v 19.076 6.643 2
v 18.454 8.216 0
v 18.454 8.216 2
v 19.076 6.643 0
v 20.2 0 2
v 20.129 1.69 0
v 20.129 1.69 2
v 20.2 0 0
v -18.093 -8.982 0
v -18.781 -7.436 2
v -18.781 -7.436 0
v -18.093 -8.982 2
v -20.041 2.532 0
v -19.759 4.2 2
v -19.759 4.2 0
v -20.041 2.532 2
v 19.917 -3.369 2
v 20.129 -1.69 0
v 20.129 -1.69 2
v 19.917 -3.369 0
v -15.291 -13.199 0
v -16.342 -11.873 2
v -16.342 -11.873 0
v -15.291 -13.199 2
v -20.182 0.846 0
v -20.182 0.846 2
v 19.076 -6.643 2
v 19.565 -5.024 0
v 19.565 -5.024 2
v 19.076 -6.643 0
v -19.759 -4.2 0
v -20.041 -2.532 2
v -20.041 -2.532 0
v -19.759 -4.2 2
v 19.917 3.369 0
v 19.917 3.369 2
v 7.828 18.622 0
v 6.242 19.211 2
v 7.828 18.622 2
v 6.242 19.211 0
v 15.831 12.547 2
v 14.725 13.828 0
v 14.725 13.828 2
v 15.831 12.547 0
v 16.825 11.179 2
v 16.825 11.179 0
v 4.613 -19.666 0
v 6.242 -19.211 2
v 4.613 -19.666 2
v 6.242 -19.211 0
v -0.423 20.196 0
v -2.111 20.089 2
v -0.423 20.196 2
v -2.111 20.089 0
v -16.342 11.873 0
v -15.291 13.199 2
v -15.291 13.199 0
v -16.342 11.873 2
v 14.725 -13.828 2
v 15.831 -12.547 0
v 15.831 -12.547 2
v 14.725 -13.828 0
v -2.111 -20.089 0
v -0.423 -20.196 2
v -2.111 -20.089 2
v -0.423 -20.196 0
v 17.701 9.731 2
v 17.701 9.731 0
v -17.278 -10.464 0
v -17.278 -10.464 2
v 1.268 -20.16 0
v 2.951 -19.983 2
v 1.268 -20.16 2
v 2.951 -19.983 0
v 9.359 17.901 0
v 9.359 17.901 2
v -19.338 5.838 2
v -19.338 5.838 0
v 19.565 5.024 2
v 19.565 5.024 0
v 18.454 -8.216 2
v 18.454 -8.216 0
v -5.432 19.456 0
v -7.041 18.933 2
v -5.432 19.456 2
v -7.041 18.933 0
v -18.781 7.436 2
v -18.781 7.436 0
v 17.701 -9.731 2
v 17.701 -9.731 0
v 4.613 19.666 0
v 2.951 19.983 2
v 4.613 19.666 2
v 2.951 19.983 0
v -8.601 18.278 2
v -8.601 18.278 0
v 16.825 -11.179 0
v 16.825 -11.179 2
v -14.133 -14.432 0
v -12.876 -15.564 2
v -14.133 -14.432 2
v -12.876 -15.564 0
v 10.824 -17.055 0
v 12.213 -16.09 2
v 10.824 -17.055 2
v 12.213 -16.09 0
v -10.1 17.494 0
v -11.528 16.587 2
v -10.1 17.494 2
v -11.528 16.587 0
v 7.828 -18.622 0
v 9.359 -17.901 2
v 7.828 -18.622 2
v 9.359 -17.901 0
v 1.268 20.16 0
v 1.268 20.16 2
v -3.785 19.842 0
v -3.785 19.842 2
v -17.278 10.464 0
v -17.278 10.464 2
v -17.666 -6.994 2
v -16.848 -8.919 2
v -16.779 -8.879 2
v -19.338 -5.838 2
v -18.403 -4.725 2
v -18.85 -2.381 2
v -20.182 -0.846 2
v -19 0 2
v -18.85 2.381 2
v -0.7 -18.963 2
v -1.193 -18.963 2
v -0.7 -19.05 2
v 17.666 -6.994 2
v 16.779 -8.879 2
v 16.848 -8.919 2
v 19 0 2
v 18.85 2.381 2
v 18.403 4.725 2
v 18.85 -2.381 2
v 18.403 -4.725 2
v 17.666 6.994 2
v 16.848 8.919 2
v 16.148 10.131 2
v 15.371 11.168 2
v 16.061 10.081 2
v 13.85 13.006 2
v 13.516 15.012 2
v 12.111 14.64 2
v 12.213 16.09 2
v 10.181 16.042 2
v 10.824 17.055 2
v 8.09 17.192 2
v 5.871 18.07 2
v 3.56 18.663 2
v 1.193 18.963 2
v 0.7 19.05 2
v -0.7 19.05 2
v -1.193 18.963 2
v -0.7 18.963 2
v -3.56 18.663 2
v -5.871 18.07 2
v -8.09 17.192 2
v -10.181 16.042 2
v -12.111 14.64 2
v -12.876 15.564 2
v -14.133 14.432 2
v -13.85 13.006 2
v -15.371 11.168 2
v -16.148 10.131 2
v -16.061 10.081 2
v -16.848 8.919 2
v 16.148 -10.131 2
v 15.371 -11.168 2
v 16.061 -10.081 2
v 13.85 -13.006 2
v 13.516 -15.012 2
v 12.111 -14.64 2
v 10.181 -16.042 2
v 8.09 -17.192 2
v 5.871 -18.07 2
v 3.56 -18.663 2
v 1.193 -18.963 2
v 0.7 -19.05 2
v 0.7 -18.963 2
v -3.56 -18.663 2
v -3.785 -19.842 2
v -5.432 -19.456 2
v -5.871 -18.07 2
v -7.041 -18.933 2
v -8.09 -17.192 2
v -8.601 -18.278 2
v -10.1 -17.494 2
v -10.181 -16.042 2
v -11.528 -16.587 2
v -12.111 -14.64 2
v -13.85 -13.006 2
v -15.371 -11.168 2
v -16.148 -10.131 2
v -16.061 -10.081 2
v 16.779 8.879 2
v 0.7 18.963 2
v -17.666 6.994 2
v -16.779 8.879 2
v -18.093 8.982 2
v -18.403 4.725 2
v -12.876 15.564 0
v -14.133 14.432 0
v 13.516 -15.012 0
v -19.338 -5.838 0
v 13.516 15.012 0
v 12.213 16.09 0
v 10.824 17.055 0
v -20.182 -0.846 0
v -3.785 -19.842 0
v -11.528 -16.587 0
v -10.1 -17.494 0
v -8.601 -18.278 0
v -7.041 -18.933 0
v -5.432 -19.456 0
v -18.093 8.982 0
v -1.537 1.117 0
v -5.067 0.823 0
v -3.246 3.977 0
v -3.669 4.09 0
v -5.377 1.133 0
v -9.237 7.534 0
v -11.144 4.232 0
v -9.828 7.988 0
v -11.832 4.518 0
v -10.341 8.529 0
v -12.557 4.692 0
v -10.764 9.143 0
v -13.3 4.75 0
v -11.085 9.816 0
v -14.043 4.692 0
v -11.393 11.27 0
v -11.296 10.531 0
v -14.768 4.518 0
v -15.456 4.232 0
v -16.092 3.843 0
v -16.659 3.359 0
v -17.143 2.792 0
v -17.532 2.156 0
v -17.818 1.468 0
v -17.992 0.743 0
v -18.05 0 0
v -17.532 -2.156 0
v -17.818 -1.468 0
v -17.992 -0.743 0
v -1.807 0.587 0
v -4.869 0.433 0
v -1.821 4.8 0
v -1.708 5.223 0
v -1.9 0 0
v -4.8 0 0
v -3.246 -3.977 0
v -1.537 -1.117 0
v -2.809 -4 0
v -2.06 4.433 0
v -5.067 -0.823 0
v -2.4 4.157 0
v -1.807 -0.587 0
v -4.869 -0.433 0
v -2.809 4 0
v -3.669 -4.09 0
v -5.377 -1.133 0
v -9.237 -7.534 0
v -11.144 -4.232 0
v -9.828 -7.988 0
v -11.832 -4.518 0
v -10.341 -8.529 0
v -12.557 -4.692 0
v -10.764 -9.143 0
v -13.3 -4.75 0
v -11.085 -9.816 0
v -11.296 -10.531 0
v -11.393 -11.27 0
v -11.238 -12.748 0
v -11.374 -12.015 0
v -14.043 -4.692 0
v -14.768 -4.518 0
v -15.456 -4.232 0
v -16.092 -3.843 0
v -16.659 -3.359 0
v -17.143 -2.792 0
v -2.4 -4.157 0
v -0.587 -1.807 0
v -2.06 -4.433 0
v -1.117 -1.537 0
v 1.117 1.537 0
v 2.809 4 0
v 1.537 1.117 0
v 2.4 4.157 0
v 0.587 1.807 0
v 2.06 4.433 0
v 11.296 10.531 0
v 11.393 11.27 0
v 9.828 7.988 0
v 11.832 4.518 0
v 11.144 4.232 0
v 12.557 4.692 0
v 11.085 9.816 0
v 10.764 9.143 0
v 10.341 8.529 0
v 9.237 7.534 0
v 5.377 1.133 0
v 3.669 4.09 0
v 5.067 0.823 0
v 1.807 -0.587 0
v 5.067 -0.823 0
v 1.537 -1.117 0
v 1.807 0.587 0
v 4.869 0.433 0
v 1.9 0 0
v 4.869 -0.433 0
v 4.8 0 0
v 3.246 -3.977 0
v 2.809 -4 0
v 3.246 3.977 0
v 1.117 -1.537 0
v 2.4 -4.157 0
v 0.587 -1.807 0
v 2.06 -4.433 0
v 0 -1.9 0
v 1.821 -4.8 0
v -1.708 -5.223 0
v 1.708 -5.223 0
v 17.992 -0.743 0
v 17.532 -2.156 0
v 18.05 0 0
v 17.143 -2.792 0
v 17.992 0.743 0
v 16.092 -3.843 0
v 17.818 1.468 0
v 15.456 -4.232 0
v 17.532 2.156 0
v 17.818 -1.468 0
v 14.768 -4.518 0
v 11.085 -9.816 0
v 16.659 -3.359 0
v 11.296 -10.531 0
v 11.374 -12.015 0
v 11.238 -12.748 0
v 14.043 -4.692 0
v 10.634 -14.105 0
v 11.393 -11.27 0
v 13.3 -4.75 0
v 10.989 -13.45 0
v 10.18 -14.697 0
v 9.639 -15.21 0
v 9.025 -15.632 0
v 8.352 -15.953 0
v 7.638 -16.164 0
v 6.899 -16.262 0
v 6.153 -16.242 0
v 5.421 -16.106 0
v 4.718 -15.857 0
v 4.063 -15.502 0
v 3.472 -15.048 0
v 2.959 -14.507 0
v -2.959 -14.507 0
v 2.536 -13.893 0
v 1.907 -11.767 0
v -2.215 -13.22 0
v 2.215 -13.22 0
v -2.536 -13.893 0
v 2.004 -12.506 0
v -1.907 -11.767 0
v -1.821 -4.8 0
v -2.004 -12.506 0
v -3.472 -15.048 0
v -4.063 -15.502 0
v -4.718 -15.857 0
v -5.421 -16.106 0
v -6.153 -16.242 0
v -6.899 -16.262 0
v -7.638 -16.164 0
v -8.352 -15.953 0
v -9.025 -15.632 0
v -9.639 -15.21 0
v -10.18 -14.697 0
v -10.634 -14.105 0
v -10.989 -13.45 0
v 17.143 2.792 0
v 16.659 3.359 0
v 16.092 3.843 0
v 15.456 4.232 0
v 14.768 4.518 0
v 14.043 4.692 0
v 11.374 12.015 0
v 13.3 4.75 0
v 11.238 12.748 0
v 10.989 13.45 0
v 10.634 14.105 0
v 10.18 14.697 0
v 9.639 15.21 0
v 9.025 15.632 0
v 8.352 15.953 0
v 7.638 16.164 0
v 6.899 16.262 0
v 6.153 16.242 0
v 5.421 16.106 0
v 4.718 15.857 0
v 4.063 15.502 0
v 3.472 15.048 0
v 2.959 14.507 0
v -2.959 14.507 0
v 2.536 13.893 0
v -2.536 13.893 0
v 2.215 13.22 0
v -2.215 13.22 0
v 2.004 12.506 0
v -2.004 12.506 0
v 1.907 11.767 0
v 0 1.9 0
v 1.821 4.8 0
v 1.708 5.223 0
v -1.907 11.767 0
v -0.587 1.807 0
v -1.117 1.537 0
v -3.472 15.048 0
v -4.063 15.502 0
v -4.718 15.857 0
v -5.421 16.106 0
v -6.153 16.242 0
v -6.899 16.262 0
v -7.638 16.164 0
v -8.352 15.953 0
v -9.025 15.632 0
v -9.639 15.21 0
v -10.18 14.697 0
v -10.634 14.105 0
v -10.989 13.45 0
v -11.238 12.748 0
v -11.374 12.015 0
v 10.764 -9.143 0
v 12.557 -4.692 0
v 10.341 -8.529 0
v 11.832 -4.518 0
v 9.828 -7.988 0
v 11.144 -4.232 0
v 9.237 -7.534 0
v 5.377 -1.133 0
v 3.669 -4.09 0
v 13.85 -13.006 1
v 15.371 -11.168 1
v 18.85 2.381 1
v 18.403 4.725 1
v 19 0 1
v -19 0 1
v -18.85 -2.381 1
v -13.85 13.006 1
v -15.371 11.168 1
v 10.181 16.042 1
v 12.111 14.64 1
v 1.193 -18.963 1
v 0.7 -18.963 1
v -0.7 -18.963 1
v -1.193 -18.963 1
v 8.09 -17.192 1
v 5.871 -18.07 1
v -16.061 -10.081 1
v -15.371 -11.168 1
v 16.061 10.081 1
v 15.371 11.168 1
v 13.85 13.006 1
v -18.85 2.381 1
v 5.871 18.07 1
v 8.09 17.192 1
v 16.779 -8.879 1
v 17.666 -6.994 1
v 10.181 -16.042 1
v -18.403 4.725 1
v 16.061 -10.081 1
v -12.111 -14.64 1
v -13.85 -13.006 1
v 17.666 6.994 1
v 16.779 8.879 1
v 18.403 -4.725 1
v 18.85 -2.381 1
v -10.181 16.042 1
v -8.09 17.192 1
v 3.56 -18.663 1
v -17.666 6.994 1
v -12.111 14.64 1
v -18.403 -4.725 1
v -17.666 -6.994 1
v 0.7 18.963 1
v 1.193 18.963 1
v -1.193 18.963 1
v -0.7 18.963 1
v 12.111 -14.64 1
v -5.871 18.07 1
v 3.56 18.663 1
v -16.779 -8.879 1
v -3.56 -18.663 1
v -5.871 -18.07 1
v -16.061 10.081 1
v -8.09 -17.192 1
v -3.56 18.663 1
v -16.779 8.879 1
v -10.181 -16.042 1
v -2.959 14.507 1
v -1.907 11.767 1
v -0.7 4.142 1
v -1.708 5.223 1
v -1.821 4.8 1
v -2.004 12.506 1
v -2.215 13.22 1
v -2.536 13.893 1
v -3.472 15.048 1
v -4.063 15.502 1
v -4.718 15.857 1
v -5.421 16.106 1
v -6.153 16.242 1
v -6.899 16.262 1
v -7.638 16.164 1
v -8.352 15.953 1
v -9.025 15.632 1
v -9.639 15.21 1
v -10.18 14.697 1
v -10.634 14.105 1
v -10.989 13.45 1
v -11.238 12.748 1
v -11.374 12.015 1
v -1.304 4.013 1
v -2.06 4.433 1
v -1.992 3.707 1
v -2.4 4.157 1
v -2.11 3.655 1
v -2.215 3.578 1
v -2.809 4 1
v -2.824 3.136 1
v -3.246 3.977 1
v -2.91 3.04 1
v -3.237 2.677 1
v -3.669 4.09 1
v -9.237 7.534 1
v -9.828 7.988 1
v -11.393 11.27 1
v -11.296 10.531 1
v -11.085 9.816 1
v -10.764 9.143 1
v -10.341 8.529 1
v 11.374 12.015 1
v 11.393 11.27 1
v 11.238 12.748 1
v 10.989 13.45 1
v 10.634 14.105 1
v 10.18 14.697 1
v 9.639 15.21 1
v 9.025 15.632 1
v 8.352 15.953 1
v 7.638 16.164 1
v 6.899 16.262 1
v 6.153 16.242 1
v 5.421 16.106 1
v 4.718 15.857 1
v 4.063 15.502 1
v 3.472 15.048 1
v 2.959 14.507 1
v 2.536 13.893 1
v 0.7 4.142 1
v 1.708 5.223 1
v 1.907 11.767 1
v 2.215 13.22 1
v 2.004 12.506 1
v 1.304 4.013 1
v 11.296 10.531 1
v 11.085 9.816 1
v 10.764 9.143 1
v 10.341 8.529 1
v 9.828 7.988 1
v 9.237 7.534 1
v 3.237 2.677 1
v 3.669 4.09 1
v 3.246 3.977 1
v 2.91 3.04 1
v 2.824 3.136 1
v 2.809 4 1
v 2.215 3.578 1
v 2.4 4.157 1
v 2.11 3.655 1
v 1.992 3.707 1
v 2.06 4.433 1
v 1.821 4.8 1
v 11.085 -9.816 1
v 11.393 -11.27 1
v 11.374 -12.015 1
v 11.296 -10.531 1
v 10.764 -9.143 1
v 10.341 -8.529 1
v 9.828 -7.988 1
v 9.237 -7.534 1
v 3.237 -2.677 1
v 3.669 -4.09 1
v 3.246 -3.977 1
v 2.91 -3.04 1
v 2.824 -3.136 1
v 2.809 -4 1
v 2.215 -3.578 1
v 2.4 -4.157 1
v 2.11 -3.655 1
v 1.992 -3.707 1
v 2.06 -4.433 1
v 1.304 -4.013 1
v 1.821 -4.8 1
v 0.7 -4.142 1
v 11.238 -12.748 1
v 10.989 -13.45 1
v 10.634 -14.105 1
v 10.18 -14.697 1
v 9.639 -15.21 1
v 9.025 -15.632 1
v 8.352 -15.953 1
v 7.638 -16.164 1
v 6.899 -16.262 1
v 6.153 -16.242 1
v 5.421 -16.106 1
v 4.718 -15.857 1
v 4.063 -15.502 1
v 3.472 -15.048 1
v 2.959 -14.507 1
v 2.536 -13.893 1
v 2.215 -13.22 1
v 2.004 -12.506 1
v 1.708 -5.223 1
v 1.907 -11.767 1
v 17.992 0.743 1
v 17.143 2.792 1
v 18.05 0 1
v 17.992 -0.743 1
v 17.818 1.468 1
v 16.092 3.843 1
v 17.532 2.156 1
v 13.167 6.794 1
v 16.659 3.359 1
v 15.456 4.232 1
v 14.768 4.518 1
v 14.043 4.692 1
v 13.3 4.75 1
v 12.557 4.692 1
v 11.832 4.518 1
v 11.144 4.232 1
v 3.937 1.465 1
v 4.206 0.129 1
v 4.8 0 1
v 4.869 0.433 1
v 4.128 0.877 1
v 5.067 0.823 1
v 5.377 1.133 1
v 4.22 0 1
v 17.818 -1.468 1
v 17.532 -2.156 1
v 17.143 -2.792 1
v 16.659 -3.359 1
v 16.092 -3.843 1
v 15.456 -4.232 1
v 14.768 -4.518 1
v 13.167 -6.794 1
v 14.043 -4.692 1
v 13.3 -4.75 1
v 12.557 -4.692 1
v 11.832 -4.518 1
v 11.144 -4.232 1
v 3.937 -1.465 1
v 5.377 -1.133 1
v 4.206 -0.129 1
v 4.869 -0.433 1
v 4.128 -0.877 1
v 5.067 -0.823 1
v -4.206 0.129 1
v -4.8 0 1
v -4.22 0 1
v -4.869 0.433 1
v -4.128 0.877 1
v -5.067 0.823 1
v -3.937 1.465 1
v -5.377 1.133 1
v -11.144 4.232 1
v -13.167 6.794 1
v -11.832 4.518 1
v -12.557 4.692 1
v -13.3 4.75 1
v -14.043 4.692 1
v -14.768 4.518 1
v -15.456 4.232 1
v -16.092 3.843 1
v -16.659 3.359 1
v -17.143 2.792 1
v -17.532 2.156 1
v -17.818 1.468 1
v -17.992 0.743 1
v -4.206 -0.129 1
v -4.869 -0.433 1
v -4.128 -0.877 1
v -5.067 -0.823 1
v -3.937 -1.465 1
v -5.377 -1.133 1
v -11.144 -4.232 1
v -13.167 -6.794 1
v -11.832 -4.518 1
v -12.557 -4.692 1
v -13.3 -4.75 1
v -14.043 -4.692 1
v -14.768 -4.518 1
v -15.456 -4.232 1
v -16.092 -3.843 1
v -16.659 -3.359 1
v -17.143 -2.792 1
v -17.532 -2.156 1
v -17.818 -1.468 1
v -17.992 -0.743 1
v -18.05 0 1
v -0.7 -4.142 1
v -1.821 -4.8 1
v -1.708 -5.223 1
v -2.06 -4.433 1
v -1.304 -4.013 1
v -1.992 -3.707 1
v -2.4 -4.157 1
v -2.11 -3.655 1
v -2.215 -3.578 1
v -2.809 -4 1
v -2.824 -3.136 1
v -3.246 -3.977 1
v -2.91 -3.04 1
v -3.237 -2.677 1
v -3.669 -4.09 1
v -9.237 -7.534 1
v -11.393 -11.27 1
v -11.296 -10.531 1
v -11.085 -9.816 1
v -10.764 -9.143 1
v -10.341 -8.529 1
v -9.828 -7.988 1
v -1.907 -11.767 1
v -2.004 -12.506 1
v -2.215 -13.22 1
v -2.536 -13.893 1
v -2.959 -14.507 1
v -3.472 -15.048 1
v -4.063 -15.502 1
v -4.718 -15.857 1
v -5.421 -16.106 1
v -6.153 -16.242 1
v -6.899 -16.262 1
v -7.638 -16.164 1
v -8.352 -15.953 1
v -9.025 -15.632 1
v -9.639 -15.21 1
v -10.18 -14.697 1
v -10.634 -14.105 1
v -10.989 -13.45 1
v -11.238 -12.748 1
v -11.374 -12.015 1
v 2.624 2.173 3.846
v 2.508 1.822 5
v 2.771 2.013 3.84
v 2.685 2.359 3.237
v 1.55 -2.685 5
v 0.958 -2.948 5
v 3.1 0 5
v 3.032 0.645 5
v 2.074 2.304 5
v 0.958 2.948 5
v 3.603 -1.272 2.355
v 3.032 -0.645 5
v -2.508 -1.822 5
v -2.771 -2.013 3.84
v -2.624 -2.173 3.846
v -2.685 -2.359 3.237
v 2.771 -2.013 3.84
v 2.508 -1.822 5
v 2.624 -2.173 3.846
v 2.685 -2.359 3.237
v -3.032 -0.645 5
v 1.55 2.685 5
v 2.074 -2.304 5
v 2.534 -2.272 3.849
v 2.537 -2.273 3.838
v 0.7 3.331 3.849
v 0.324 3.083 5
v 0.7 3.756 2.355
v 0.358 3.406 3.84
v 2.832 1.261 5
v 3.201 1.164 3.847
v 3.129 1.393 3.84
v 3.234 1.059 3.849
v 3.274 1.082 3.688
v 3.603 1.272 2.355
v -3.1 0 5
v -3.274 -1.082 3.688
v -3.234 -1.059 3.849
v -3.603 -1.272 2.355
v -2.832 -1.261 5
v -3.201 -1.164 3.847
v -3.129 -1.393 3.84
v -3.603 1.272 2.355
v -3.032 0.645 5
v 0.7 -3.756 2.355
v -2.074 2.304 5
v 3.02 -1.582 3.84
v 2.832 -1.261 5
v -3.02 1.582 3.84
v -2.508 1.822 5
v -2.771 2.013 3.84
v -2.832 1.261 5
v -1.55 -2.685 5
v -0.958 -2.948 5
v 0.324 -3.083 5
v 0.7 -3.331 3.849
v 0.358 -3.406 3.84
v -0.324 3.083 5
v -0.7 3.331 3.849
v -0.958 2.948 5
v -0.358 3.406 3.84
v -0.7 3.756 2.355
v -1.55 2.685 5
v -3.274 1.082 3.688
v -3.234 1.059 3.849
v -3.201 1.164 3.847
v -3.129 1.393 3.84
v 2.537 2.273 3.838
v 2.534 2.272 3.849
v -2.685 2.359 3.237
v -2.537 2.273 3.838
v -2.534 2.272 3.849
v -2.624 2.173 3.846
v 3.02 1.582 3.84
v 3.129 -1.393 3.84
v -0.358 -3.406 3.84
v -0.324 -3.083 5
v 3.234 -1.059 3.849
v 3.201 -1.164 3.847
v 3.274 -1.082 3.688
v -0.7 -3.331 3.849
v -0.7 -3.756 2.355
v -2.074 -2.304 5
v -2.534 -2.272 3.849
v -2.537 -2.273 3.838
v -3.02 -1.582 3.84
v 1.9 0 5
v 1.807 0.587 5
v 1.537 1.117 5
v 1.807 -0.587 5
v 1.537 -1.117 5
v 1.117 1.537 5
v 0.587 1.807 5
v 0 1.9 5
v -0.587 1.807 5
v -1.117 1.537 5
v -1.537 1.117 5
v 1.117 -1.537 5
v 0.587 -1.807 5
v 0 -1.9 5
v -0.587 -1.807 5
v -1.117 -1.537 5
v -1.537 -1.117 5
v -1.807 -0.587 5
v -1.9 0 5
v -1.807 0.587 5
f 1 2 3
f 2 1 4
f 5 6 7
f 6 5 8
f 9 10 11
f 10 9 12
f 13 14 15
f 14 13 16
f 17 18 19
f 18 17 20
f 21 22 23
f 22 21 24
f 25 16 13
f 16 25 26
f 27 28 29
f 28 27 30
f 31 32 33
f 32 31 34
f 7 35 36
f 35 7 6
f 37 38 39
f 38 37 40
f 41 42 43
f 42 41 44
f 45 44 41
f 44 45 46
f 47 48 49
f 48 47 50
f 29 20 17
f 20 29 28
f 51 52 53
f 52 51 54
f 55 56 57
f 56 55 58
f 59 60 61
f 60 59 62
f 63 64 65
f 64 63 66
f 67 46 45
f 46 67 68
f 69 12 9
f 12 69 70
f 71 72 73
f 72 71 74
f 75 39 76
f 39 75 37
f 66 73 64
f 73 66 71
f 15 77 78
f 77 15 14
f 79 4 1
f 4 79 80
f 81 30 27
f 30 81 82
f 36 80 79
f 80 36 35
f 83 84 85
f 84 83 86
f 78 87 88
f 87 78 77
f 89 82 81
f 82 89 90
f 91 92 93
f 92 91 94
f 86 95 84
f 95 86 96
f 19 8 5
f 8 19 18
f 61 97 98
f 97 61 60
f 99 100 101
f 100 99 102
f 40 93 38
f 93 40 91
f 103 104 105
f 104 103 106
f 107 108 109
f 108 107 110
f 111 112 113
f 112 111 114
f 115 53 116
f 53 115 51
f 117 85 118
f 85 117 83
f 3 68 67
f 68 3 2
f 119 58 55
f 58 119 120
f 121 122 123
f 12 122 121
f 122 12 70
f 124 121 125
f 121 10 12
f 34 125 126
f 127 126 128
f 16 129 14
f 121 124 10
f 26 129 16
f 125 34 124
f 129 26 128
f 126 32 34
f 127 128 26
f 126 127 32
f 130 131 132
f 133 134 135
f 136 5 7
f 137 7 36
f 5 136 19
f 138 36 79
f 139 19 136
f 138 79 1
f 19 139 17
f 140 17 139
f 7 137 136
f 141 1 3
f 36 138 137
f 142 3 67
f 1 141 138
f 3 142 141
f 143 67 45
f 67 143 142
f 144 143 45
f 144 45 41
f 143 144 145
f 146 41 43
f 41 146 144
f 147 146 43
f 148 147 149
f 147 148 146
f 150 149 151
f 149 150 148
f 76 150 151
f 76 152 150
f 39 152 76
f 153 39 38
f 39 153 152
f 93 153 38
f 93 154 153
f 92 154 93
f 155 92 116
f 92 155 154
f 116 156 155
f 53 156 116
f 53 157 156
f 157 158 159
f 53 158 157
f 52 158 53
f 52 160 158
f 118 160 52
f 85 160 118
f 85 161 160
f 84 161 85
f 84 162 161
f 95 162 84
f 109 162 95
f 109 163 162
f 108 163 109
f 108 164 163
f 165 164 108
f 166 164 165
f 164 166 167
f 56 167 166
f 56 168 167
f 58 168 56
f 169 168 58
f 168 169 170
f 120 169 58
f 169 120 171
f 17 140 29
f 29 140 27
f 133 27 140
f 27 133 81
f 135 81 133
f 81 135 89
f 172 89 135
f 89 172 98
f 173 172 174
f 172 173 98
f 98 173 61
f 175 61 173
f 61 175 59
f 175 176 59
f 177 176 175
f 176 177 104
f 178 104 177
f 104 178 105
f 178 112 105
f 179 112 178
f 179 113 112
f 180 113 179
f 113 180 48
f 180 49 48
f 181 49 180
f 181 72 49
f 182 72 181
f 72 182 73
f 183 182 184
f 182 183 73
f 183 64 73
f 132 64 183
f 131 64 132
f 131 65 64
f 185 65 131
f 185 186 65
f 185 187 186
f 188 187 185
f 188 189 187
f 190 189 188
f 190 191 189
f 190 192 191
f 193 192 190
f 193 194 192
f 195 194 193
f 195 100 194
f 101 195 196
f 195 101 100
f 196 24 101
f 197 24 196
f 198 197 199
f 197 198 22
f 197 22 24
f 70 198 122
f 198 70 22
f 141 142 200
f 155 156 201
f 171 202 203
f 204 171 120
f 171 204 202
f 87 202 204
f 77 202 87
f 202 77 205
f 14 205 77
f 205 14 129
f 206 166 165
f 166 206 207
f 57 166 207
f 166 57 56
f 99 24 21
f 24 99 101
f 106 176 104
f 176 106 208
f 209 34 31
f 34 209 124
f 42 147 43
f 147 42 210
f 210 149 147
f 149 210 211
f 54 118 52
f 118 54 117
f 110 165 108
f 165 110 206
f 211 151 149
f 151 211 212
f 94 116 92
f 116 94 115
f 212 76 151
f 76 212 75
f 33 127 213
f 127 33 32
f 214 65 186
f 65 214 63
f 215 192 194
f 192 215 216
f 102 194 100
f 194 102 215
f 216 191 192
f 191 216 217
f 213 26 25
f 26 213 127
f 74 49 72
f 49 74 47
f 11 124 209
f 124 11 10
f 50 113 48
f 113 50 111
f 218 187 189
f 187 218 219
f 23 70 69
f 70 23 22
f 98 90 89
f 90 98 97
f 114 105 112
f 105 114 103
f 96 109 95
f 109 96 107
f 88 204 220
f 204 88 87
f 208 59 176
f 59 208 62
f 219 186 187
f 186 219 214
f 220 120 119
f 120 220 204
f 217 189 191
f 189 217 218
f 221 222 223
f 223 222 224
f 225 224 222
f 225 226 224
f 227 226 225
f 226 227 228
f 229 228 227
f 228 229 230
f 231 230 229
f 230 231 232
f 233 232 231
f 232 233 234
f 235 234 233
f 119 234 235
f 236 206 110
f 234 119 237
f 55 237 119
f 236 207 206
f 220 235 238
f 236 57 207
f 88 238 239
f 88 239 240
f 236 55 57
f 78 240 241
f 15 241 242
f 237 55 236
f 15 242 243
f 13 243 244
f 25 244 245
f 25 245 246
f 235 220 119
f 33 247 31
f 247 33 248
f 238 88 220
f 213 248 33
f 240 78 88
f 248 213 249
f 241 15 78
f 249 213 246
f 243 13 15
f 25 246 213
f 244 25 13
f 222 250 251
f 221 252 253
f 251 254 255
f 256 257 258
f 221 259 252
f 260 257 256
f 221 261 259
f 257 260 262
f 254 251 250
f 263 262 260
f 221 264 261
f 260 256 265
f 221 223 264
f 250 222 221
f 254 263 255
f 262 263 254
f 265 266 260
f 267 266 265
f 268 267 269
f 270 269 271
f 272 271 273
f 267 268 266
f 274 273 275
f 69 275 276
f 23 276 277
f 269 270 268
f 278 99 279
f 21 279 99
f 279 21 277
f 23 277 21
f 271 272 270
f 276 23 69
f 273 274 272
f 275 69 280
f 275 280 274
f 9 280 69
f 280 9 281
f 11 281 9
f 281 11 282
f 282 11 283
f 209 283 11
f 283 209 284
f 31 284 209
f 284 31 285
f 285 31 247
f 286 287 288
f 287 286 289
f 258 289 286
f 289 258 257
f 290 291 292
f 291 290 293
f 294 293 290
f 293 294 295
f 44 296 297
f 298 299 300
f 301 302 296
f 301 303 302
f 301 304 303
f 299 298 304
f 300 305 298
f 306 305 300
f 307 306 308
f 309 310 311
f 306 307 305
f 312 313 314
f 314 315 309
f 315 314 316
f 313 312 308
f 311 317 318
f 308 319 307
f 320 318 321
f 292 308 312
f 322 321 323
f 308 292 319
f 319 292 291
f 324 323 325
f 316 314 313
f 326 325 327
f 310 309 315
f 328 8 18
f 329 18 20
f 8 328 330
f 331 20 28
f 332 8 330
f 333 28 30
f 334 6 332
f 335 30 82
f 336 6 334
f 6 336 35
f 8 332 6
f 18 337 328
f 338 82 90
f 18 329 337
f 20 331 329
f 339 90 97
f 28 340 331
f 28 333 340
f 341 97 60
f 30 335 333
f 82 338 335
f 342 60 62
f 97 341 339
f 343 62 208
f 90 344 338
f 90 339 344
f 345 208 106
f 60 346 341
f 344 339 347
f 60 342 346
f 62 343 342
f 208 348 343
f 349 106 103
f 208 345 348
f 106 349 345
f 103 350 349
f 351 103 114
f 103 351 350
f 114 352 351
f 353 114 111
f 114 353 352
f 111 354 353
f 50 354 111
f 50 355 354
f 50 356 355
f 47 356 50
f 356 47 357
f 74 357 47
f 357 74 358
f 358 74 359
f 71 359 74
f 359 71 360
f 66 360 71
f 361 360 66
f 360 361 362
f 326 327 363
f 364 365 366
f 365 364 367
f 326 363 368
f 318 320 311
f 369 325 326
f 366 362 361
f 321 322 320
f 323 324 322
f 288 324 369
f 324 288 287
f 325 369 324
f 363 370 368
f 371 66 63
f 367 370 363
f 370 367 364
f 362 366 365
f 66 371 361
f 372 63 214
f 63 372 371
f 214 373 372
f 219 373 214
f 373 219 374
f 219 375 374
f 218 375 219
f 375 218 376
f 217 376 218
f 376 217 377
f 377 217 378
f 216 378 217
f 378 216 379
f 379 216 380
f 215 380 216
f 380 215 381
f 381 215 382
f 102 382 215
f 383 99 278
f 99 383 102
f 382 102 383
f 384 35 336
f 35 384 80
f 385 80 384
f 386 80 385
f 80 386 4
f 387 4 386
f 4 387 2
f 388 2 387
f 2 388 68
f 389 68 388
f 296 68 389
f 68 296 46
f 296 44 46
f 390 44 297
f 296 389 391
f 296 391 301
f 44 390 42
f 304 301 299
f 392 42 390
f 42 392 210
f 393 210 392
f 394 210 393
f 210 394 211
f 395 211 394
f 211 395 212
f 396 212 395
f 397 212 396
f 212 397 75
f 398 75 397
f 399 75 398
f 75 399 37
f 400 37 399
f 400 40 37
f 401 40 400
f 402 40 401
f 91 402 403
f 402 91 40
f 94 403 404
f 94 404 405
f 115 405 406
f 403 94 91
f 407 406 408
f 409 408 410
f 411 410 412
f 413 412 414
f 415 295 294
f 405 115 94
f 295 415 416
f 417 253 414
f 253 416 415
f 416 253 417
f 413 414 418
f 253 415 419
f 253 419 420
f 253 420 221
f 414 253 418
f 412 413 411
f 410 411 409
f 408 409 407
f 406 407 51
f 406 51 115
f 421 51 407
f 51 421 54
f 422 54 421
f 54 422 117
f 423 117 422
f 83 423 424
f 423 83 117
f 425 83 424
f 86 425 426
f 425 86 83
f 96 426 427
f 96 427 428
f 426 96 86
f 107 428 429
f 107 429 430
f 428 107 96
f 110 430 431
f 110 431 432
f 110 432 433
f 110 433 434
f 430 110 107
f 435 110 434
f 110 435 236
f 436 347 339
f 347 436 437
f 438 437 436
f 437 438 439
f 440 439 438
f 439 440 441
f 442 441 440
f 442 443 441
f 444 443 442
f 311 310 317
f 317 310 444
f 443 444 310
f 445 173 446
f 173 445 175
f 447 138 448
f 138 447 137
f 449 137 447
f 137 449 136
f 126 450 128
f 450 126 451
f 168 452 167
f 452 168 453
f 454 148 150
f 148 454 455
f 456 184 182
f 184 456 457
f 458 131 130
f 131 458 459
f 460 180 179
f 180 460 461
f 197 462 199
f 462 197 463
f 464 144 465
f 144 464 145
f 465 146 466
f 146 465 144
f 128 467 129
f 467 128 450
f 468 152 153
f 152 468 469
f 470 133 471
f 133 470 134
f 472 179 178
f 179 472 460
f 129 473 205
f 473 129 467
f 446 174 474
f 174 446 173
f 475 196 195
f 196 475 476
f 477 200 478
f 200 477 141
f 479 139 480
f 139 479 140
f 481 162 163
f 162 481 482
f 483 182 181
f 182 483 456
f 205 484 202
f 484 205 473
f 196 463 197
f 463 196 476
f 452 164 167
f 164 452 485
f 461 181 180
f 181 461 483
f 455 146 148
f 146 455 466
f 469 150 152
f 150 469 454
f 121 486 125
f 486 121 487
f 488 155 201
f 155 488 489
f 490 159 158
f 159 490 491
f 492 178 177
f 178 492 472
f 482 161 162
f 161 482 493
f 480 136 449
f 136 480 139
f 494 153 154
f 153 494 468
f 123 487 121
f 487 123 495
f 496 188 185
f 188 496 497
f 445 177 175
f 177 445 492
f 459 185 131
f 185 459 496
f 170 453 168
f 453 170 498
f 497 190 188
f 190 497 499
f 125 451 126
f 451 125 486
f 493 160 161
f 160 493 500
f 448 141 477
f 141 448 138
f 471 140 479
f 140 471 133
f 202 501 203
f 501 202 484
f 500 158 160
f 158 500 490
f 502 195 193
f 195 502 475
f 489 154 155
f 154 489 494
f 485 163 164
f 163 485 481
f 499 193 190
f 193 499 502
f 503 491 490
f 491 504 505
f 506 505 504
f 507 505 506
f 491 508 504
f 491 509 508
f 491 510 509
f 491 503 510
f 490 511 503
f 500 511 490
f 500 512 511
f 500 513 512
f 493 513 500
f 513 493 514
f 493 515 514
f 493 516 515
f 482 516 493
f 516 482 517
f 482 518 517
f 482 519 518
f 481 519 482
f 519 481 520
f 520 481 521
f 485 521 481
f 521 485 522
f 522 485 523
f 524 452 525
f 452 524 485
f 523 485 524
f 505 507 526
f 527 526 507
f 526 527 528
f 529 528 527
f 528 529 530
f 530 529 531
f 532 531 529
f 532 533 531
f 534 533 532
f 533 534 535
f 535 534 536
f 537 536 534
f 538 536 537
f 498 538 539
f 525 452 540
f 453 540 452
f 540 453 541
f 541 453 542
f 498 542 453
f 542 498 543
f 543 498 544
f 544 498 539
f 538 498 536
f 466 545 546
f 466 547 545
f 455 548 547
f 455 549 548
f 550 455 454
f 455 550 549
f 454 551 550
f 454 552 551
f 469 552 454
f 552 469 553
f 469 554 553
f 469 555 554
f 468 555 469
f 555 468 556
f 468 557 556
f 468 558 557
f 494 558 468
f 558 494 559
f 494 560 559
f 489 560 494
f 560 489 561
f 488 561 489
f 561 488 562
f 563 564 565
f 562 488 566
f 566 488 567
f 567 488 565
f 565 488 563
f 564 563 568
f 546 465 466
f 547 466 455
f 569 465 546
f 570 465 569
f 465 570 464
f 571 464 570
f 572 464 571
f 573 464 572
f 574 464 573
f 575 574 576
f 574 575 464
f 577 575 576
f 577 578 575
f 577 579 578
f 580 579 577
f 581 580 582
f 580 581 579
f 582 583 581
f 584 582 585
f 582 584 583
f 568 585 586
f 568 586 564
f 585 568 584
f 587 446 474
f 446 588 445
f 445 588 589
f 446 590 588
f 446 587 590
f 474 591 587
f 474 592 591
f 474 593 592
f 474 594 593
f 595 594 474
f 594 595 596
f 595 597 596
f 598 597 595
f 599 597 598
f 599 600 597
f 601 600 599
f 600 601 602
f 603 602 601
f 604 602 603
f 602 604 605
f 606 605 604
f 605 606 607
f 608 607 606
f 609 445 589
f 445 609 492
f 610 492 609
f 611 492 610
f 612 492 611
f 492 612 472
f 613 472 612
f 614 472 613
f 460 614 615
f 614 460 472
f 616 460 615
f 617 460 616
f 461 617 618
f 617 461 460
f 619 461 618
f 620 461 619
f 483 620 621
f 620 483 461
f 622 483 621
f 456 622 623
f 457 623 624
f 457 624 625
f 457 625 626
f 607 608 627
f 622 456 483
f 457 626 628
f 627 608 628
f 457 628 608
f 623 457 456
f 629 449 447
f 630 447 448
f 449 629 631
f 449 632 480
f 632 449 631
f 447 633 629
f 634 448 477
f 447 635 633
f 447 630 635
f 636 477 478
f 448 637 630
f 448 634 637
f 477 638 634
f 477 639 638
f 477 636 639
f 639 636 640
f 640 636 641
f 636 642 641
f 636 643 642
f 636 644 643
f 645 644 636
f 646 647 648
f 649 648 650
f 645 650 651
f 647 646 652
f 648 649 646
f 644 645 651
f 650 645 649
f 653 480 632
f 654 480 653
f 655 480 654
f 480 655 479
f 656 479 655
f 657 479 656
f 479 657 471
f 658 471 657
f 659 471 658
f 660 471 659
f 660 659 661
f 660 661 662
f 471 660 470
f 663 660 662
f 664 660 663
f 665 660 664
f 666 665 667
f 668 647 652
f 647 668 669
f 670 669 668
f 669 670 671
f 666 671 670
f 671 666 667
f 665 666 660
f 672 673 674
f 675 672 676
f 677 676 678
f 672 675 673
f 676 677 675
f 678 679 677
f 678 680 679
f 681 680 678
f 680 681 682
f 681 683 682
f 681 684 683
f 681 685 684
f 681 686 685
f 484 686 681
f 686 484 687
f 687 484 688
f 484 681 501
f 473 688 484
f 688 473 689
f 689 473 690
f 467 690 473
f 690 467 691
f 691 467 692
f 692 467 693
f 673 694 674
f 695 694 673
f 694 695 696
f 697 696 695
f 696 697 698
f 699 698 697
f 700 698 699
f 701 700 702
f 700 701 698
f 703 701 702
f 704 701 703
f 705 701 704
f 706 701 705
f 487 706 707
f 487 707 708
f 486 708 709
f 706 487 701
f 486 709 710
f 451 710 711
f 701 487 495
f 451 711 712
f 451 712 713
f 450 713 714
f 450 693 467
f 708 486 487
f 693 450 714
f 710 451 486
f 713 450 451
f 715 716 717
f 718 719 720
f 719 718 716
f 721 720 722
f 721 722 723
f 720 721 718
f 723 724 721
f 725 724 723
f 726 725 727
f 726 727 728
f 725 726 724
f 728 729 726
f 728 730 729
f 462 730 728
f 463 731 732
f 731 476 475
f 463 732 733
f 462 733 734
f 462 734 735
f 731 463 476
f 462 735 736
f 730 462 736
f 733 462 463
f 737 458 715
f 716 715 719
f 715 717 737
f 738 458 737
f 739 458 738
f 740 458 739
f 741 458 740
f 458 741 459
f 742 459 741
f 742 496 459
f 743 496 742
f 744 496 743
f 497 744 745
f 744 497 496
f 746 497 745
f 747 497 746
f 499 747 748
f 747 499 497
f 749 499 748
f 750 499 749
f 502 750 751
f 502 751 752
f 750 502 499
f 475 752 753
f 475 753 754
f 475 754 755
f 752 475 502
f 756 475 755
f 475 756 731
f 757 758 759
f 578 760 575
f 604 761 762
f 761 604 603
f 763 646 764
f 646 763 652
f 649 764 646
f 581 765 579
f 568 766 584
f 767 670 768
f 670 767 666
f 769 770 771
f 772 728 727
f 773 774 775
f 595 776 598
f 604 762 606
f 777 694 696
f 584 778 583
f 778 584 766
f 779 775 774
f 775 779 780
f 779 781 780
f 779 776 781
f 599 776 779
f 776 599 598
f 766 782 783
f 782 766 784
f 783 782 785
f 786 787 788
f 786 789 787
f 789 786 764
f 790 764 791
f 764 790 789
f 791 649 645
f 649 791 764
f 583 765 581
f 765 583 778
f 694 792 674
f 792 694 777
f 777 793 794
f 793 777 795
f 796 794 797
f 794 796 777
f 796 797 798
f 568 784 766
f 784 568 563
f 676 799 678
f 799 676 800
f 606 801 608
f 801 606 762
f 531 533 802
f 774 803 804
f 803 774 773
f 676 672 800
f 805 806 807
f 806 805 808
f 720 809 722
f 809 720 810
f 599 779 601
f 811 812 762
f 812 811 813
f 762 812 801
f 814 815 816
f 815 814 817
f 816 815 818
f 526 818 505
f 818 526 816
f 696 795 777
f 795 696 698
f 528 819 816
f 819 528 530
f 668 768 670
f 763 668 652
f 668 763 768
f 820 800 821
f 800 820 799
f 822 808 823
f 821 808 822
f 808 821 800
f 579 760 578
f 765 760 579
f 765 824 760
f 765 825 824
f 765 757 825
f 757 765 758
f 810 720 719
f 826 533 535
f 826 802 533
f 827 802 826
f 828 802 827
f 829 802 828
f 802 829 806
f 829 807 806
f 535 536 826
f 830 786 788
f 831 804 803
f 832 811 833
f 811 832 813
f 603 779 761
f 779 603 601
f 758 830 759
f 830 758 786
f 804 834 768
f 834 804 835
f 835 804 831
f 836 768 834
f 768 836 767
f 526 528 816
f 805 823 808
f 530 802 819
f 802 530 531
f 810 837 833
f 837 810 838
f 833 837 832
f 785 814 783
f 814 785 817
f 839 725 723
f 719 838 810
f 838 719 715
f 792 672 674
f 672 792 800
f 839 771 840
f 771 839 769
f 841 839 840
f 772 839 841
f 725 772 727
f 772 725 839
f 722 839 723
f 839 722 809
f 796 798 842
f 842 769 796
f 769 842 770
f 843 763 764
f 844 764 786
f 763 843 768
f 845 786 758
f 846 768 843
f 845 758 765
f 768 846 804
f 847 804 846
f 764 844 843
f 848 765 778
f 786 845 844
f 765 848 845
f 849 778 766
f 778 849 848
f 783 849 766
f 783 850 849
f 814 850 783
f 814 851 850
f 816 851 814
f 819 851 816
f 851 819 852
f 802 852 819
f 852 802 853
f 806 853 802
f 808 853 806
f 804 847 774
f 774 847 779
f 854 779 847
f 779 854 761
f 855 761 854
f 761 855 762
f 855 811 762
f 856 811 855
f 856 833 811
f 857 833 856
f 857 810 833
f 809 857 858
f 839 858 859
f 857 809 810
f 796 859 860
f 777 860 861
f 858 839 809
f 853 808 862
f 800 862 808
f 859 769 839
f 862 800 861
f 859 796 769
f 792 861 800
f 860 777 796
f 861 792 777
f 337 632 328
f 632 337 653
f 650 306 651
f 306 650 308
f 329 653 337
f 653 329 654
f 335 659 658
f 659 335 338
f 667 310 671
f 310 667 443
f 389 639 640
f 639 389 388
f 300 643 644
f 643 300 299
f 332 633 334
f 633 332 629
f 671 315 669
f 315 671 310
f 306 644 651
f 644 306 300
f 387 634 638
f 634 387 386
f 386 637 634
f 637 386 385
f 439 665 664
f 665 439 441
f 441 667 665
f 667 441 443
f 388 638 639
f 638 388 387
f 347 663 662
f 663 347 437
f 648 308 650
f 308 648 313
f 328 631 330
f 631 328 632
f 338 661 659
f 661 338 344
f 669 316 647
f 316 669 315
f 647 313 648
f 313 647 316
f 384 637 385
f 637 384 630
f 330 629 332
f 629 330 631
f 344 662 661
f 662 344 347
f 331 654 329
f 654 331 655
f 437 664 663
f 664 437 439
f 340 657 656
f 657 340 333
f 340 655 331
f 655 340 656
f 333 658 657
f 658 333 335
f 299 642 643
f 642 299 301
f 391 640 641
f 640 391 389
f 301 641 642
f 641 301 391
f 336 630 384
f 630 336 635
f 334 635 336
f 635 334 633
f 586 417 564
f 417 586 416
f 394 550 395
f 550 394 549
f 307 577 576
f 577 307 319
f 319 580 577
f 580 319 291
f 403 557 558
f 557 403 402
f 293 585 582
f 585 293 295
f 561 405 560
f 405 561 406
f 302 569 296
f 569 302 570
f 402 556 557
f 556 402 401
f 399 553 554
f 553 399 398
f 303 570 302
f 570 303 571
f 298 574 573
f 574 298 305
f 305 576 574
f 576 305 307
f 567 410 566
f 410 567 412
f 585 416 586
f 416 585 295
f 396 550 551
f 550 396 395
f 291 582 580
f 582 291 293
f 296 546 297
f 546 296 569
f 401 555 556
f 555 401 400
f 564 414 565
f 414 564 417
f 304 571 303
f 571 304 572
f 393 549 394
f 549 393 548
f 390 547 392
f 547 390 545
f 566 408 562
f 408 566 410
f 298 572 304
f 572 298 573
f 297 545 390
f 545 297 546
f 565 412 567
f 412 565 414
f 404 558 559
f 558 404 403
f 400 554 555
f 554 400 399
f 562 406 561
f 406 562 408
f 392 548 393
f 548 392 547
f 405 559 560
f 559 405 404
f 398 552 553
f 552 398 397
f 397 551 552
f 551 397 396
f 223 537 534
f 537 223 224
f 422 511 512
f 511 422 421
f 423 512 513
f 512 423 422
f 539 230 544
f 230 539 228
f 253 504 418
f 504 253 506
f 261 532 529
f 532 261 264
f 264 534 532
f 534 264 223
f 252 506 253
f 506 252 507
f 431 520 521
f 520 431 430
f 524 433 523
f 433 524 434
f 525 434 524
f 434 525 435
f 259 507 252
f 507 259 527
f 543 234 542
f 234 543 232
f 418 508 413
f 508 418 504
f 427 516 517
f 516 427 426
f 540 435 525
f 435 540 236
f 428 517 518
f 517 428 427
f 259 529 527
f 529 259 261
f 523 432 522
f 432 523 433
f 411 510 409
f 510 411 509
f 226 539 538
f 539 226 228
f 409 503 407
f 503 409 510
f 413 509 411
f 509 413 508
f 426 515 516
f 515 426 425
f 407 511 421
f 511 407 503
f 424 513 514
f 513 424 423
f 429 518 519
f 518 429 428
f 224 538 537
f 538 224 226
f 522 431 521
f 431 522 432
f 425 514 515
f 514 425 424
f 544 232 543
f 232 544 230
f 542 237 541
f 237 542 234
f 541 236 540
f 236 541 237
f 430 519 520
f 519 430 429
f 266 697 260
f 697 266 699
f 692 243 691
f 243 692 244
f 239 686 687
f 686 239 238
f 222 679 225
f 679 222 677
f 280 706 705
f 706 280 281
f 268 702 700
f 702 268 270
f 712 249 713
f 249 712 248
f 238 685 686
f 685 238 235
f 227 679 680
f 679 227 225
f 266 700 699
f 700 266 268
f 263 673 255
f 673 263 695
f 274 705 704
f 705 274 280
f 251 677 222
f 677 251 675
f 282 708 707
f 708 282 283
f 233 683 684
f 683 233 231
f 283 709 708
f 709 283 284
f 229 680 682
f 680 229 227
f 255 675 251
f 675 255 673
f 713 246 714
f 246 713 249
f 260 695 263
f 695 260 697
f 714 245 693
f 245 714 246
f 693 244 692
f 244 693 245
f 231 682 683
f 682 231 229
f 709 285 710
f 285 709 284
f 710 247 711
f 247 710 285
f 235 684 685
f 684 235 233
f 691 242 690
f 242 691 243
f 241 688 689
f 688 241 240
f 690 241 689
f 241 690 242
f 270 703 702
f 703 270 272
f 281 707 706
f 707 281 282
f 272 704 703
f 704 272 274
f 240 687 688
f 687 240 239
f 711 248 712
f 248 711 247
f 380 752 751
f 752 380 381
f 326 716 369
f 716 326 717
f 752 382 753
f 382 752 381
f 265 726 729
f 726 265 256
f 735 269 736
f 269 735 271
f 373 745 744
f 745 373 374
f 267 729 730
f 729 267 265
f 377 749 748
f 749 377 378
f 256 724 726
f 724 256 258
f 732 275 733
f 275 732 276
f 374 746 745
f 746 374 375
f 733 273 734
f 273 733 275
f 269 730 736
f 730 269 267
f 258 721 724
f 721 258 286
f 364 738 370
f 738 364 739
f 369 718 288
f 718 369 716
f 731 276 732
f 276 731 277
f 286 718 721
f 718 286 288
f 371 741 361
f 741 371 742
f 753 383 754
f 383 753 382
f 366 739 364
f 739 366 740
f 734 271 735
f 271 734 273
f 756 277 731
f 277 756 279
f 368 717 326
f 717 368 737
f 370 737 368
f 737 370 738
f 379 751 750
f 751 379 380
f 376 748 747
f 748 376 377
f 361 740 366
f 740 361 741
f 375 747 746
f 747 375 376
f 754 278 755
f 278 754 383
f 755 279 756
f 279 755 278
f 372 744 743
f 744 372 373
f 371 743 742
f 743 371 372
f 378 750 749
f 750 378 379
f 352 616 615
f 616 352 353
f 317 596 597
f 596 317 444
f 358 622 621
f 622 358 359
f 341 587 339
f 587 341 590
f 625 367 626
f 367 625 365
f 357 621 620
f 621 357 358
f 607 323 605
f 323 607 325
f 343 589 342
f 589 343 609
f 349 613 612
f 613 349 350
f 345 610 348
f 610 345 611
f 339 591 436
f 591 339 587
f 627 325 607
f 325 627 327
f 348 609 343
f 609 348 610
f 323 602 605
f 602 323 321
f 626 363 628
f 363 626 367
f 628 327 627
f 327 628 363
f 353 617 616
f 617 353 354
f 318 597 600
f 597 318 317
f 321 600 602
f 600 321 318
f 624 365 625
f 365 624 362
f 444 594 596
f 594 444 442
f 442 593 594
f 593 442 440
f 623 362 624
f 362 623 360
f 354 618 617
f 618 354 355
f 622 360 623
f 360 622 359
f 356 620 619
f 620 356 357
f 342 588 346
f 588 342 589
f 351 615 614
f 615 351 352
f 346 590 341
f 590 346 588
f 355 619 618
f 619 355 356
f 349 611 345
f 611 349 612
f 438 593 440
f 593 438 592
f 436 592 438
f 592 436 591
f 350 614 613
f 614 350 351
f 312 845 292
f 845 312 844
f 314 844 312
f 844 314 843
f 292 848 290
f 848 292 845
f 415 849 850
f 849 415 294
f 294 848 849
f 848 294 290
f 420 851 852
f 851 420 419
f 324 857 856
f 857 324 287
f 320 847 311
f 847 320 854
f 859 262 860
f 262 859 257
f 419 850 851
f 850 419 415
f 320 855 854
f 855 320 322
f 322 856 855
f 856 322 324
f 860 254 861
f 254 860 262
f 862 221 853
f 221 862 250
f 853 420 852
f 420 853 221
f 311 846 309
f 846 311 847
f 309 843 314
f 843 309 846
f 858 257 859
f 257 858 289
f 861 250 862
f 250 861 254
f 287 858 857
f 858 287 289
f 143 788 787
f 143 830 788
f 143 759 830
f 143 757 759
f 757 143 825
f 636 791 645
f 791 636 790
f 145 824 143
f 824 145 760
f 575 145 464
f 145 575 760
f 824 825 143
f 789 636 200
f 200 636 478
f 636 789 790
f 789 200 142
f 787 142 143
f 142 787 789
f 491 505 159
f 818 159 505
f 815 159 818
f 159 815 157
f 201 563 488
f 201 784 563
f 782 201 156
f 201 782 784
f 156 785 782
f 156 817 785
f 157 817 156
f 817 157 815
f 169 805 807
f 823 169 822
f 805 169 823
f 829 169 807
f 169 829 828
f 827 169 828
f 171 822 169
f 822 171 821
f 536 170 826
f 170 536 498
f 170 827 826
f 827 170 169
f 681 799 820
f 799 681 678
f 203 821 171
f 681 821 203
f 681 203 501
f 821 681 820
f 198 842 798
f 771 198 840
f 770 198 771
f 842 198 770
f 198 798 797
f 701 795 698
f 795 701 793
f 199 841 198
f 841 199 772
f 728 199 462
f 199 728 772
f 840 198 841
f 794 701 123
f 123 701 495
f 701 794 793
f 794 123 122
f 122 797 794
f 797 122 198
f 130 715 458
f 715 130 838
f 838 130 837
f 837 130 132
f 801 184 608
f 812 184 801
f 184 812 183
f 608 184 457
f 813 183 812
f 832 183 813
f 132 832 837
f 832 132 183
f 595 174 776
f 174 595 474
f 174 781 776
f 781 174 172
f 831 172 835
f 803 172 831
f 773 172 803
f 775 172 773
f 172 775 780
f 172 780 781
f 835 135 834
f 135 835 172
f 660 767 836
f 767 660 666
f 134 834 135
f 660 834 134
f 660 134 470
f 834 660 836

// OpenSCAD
//***** Shockflyer Wheel ******
//*    Henning Stöcklein              *
//*  Free for noncommercial use   *
//*  Version 27.8.2016                *
//*************************

// Axis hole diameter
dwelle = 3.8; // [2.0:0.1:4.0]

// Wheel disc thickness
dicke = 1.0; // [0.8:0.1:2.0]

// Wheel disc diameter (default = 38)
diam  = 38; // [25:45]

// Tire radius 
rkragen = 1.2; // [0.8:0.1:2.5]

// Tire height
hkragen = 1; // [0.8:0.1:2.5]

// Center hub height
hnabe = 5; // [1:0.2:6]

// Center hub diameter
dnabe = 9; // [5:12]

// Spoke height
hspeiche = 3 ; // [1:0.1:5]

// Show Spacer?
showspacer = 0 ; // [1:YES, 0:NO]

// Spacer height
hspacer = 3 ; // [1:0.1:4]

// Spacer hole diameter
dspacer = 3.6; // [2.0:0.1:4.0]


//*********** End of user parameters *************

module wheel ()
{
  difference() {
    union() {
	   // Scheibe und Nabe
       translate ([0,0,dicke/2]) cylinder (r=diam/2, h=dicke, $fn=50, center=true);
   	   translate ([0,0,hnabe/2]) cylinder (r1=dnabe/2, r2=dwelle/2+1.2, h=hnabe, $fn=30, center=true);

	   // Kragen aussenherum = Lauffläche
		difference ()
        {
     	  translate ([0,0,(dicke+hkragen)/2]) 
              cylinder (r=diam/2+rkragen, h=dicke+hkragen, $fn=75, center=true);
          cylinder (r=diam/2, h=20, $fn=50, center=true);
      } // diff
    } // union

    // Loch in der Nabe
    cylinder (r=dwelle/2, h=20, $fn=20, center=true);

    // 6 Aussparungen zwischen den Speichen
    for (x = [0:60:360]) {
      rotate ([0,0,x]) hull()
      {
          translate ([diam*0.35,0,0]) cylinder (r=diam/8, h=20, $fn=40, center=true);
          translate ([6.2,0,0]) cylinder (r=1.4, h=20, $fn=20, center=true);
      }
    }
  }

  // 6 Versteifungsrippen zwischen Nabe und Speichen
  for (x = [30:60:390])
  {
	   rotate ([0,0,x]) hull()
       {
           translate ([dwelle/2+0.1,0,(dicke+hspeiche)/2]) cube ([0.1, 1.4, dicke+hspeiche], center=true);
           translate ([diam/2,0,(dicke+hkragen)/2]) cube ([0.1, 1.4, dicke+hkragen], center=true);
       }
  } // for
} // module wheel

// Distanzröllchen
module spacer()
{
  translate ([0,0,hspacer/2]) 
    difference()
    {
      cylinder (r=0.7*dnabe/2, h=hspacer, $fn=30, center=true);
      cylinder (r=dspacer/2, h=20, $fn=20, center=true);
    }
}

wheel() ;

if (showspacer == 1) translate ([25,25,0]) spacer() ;
